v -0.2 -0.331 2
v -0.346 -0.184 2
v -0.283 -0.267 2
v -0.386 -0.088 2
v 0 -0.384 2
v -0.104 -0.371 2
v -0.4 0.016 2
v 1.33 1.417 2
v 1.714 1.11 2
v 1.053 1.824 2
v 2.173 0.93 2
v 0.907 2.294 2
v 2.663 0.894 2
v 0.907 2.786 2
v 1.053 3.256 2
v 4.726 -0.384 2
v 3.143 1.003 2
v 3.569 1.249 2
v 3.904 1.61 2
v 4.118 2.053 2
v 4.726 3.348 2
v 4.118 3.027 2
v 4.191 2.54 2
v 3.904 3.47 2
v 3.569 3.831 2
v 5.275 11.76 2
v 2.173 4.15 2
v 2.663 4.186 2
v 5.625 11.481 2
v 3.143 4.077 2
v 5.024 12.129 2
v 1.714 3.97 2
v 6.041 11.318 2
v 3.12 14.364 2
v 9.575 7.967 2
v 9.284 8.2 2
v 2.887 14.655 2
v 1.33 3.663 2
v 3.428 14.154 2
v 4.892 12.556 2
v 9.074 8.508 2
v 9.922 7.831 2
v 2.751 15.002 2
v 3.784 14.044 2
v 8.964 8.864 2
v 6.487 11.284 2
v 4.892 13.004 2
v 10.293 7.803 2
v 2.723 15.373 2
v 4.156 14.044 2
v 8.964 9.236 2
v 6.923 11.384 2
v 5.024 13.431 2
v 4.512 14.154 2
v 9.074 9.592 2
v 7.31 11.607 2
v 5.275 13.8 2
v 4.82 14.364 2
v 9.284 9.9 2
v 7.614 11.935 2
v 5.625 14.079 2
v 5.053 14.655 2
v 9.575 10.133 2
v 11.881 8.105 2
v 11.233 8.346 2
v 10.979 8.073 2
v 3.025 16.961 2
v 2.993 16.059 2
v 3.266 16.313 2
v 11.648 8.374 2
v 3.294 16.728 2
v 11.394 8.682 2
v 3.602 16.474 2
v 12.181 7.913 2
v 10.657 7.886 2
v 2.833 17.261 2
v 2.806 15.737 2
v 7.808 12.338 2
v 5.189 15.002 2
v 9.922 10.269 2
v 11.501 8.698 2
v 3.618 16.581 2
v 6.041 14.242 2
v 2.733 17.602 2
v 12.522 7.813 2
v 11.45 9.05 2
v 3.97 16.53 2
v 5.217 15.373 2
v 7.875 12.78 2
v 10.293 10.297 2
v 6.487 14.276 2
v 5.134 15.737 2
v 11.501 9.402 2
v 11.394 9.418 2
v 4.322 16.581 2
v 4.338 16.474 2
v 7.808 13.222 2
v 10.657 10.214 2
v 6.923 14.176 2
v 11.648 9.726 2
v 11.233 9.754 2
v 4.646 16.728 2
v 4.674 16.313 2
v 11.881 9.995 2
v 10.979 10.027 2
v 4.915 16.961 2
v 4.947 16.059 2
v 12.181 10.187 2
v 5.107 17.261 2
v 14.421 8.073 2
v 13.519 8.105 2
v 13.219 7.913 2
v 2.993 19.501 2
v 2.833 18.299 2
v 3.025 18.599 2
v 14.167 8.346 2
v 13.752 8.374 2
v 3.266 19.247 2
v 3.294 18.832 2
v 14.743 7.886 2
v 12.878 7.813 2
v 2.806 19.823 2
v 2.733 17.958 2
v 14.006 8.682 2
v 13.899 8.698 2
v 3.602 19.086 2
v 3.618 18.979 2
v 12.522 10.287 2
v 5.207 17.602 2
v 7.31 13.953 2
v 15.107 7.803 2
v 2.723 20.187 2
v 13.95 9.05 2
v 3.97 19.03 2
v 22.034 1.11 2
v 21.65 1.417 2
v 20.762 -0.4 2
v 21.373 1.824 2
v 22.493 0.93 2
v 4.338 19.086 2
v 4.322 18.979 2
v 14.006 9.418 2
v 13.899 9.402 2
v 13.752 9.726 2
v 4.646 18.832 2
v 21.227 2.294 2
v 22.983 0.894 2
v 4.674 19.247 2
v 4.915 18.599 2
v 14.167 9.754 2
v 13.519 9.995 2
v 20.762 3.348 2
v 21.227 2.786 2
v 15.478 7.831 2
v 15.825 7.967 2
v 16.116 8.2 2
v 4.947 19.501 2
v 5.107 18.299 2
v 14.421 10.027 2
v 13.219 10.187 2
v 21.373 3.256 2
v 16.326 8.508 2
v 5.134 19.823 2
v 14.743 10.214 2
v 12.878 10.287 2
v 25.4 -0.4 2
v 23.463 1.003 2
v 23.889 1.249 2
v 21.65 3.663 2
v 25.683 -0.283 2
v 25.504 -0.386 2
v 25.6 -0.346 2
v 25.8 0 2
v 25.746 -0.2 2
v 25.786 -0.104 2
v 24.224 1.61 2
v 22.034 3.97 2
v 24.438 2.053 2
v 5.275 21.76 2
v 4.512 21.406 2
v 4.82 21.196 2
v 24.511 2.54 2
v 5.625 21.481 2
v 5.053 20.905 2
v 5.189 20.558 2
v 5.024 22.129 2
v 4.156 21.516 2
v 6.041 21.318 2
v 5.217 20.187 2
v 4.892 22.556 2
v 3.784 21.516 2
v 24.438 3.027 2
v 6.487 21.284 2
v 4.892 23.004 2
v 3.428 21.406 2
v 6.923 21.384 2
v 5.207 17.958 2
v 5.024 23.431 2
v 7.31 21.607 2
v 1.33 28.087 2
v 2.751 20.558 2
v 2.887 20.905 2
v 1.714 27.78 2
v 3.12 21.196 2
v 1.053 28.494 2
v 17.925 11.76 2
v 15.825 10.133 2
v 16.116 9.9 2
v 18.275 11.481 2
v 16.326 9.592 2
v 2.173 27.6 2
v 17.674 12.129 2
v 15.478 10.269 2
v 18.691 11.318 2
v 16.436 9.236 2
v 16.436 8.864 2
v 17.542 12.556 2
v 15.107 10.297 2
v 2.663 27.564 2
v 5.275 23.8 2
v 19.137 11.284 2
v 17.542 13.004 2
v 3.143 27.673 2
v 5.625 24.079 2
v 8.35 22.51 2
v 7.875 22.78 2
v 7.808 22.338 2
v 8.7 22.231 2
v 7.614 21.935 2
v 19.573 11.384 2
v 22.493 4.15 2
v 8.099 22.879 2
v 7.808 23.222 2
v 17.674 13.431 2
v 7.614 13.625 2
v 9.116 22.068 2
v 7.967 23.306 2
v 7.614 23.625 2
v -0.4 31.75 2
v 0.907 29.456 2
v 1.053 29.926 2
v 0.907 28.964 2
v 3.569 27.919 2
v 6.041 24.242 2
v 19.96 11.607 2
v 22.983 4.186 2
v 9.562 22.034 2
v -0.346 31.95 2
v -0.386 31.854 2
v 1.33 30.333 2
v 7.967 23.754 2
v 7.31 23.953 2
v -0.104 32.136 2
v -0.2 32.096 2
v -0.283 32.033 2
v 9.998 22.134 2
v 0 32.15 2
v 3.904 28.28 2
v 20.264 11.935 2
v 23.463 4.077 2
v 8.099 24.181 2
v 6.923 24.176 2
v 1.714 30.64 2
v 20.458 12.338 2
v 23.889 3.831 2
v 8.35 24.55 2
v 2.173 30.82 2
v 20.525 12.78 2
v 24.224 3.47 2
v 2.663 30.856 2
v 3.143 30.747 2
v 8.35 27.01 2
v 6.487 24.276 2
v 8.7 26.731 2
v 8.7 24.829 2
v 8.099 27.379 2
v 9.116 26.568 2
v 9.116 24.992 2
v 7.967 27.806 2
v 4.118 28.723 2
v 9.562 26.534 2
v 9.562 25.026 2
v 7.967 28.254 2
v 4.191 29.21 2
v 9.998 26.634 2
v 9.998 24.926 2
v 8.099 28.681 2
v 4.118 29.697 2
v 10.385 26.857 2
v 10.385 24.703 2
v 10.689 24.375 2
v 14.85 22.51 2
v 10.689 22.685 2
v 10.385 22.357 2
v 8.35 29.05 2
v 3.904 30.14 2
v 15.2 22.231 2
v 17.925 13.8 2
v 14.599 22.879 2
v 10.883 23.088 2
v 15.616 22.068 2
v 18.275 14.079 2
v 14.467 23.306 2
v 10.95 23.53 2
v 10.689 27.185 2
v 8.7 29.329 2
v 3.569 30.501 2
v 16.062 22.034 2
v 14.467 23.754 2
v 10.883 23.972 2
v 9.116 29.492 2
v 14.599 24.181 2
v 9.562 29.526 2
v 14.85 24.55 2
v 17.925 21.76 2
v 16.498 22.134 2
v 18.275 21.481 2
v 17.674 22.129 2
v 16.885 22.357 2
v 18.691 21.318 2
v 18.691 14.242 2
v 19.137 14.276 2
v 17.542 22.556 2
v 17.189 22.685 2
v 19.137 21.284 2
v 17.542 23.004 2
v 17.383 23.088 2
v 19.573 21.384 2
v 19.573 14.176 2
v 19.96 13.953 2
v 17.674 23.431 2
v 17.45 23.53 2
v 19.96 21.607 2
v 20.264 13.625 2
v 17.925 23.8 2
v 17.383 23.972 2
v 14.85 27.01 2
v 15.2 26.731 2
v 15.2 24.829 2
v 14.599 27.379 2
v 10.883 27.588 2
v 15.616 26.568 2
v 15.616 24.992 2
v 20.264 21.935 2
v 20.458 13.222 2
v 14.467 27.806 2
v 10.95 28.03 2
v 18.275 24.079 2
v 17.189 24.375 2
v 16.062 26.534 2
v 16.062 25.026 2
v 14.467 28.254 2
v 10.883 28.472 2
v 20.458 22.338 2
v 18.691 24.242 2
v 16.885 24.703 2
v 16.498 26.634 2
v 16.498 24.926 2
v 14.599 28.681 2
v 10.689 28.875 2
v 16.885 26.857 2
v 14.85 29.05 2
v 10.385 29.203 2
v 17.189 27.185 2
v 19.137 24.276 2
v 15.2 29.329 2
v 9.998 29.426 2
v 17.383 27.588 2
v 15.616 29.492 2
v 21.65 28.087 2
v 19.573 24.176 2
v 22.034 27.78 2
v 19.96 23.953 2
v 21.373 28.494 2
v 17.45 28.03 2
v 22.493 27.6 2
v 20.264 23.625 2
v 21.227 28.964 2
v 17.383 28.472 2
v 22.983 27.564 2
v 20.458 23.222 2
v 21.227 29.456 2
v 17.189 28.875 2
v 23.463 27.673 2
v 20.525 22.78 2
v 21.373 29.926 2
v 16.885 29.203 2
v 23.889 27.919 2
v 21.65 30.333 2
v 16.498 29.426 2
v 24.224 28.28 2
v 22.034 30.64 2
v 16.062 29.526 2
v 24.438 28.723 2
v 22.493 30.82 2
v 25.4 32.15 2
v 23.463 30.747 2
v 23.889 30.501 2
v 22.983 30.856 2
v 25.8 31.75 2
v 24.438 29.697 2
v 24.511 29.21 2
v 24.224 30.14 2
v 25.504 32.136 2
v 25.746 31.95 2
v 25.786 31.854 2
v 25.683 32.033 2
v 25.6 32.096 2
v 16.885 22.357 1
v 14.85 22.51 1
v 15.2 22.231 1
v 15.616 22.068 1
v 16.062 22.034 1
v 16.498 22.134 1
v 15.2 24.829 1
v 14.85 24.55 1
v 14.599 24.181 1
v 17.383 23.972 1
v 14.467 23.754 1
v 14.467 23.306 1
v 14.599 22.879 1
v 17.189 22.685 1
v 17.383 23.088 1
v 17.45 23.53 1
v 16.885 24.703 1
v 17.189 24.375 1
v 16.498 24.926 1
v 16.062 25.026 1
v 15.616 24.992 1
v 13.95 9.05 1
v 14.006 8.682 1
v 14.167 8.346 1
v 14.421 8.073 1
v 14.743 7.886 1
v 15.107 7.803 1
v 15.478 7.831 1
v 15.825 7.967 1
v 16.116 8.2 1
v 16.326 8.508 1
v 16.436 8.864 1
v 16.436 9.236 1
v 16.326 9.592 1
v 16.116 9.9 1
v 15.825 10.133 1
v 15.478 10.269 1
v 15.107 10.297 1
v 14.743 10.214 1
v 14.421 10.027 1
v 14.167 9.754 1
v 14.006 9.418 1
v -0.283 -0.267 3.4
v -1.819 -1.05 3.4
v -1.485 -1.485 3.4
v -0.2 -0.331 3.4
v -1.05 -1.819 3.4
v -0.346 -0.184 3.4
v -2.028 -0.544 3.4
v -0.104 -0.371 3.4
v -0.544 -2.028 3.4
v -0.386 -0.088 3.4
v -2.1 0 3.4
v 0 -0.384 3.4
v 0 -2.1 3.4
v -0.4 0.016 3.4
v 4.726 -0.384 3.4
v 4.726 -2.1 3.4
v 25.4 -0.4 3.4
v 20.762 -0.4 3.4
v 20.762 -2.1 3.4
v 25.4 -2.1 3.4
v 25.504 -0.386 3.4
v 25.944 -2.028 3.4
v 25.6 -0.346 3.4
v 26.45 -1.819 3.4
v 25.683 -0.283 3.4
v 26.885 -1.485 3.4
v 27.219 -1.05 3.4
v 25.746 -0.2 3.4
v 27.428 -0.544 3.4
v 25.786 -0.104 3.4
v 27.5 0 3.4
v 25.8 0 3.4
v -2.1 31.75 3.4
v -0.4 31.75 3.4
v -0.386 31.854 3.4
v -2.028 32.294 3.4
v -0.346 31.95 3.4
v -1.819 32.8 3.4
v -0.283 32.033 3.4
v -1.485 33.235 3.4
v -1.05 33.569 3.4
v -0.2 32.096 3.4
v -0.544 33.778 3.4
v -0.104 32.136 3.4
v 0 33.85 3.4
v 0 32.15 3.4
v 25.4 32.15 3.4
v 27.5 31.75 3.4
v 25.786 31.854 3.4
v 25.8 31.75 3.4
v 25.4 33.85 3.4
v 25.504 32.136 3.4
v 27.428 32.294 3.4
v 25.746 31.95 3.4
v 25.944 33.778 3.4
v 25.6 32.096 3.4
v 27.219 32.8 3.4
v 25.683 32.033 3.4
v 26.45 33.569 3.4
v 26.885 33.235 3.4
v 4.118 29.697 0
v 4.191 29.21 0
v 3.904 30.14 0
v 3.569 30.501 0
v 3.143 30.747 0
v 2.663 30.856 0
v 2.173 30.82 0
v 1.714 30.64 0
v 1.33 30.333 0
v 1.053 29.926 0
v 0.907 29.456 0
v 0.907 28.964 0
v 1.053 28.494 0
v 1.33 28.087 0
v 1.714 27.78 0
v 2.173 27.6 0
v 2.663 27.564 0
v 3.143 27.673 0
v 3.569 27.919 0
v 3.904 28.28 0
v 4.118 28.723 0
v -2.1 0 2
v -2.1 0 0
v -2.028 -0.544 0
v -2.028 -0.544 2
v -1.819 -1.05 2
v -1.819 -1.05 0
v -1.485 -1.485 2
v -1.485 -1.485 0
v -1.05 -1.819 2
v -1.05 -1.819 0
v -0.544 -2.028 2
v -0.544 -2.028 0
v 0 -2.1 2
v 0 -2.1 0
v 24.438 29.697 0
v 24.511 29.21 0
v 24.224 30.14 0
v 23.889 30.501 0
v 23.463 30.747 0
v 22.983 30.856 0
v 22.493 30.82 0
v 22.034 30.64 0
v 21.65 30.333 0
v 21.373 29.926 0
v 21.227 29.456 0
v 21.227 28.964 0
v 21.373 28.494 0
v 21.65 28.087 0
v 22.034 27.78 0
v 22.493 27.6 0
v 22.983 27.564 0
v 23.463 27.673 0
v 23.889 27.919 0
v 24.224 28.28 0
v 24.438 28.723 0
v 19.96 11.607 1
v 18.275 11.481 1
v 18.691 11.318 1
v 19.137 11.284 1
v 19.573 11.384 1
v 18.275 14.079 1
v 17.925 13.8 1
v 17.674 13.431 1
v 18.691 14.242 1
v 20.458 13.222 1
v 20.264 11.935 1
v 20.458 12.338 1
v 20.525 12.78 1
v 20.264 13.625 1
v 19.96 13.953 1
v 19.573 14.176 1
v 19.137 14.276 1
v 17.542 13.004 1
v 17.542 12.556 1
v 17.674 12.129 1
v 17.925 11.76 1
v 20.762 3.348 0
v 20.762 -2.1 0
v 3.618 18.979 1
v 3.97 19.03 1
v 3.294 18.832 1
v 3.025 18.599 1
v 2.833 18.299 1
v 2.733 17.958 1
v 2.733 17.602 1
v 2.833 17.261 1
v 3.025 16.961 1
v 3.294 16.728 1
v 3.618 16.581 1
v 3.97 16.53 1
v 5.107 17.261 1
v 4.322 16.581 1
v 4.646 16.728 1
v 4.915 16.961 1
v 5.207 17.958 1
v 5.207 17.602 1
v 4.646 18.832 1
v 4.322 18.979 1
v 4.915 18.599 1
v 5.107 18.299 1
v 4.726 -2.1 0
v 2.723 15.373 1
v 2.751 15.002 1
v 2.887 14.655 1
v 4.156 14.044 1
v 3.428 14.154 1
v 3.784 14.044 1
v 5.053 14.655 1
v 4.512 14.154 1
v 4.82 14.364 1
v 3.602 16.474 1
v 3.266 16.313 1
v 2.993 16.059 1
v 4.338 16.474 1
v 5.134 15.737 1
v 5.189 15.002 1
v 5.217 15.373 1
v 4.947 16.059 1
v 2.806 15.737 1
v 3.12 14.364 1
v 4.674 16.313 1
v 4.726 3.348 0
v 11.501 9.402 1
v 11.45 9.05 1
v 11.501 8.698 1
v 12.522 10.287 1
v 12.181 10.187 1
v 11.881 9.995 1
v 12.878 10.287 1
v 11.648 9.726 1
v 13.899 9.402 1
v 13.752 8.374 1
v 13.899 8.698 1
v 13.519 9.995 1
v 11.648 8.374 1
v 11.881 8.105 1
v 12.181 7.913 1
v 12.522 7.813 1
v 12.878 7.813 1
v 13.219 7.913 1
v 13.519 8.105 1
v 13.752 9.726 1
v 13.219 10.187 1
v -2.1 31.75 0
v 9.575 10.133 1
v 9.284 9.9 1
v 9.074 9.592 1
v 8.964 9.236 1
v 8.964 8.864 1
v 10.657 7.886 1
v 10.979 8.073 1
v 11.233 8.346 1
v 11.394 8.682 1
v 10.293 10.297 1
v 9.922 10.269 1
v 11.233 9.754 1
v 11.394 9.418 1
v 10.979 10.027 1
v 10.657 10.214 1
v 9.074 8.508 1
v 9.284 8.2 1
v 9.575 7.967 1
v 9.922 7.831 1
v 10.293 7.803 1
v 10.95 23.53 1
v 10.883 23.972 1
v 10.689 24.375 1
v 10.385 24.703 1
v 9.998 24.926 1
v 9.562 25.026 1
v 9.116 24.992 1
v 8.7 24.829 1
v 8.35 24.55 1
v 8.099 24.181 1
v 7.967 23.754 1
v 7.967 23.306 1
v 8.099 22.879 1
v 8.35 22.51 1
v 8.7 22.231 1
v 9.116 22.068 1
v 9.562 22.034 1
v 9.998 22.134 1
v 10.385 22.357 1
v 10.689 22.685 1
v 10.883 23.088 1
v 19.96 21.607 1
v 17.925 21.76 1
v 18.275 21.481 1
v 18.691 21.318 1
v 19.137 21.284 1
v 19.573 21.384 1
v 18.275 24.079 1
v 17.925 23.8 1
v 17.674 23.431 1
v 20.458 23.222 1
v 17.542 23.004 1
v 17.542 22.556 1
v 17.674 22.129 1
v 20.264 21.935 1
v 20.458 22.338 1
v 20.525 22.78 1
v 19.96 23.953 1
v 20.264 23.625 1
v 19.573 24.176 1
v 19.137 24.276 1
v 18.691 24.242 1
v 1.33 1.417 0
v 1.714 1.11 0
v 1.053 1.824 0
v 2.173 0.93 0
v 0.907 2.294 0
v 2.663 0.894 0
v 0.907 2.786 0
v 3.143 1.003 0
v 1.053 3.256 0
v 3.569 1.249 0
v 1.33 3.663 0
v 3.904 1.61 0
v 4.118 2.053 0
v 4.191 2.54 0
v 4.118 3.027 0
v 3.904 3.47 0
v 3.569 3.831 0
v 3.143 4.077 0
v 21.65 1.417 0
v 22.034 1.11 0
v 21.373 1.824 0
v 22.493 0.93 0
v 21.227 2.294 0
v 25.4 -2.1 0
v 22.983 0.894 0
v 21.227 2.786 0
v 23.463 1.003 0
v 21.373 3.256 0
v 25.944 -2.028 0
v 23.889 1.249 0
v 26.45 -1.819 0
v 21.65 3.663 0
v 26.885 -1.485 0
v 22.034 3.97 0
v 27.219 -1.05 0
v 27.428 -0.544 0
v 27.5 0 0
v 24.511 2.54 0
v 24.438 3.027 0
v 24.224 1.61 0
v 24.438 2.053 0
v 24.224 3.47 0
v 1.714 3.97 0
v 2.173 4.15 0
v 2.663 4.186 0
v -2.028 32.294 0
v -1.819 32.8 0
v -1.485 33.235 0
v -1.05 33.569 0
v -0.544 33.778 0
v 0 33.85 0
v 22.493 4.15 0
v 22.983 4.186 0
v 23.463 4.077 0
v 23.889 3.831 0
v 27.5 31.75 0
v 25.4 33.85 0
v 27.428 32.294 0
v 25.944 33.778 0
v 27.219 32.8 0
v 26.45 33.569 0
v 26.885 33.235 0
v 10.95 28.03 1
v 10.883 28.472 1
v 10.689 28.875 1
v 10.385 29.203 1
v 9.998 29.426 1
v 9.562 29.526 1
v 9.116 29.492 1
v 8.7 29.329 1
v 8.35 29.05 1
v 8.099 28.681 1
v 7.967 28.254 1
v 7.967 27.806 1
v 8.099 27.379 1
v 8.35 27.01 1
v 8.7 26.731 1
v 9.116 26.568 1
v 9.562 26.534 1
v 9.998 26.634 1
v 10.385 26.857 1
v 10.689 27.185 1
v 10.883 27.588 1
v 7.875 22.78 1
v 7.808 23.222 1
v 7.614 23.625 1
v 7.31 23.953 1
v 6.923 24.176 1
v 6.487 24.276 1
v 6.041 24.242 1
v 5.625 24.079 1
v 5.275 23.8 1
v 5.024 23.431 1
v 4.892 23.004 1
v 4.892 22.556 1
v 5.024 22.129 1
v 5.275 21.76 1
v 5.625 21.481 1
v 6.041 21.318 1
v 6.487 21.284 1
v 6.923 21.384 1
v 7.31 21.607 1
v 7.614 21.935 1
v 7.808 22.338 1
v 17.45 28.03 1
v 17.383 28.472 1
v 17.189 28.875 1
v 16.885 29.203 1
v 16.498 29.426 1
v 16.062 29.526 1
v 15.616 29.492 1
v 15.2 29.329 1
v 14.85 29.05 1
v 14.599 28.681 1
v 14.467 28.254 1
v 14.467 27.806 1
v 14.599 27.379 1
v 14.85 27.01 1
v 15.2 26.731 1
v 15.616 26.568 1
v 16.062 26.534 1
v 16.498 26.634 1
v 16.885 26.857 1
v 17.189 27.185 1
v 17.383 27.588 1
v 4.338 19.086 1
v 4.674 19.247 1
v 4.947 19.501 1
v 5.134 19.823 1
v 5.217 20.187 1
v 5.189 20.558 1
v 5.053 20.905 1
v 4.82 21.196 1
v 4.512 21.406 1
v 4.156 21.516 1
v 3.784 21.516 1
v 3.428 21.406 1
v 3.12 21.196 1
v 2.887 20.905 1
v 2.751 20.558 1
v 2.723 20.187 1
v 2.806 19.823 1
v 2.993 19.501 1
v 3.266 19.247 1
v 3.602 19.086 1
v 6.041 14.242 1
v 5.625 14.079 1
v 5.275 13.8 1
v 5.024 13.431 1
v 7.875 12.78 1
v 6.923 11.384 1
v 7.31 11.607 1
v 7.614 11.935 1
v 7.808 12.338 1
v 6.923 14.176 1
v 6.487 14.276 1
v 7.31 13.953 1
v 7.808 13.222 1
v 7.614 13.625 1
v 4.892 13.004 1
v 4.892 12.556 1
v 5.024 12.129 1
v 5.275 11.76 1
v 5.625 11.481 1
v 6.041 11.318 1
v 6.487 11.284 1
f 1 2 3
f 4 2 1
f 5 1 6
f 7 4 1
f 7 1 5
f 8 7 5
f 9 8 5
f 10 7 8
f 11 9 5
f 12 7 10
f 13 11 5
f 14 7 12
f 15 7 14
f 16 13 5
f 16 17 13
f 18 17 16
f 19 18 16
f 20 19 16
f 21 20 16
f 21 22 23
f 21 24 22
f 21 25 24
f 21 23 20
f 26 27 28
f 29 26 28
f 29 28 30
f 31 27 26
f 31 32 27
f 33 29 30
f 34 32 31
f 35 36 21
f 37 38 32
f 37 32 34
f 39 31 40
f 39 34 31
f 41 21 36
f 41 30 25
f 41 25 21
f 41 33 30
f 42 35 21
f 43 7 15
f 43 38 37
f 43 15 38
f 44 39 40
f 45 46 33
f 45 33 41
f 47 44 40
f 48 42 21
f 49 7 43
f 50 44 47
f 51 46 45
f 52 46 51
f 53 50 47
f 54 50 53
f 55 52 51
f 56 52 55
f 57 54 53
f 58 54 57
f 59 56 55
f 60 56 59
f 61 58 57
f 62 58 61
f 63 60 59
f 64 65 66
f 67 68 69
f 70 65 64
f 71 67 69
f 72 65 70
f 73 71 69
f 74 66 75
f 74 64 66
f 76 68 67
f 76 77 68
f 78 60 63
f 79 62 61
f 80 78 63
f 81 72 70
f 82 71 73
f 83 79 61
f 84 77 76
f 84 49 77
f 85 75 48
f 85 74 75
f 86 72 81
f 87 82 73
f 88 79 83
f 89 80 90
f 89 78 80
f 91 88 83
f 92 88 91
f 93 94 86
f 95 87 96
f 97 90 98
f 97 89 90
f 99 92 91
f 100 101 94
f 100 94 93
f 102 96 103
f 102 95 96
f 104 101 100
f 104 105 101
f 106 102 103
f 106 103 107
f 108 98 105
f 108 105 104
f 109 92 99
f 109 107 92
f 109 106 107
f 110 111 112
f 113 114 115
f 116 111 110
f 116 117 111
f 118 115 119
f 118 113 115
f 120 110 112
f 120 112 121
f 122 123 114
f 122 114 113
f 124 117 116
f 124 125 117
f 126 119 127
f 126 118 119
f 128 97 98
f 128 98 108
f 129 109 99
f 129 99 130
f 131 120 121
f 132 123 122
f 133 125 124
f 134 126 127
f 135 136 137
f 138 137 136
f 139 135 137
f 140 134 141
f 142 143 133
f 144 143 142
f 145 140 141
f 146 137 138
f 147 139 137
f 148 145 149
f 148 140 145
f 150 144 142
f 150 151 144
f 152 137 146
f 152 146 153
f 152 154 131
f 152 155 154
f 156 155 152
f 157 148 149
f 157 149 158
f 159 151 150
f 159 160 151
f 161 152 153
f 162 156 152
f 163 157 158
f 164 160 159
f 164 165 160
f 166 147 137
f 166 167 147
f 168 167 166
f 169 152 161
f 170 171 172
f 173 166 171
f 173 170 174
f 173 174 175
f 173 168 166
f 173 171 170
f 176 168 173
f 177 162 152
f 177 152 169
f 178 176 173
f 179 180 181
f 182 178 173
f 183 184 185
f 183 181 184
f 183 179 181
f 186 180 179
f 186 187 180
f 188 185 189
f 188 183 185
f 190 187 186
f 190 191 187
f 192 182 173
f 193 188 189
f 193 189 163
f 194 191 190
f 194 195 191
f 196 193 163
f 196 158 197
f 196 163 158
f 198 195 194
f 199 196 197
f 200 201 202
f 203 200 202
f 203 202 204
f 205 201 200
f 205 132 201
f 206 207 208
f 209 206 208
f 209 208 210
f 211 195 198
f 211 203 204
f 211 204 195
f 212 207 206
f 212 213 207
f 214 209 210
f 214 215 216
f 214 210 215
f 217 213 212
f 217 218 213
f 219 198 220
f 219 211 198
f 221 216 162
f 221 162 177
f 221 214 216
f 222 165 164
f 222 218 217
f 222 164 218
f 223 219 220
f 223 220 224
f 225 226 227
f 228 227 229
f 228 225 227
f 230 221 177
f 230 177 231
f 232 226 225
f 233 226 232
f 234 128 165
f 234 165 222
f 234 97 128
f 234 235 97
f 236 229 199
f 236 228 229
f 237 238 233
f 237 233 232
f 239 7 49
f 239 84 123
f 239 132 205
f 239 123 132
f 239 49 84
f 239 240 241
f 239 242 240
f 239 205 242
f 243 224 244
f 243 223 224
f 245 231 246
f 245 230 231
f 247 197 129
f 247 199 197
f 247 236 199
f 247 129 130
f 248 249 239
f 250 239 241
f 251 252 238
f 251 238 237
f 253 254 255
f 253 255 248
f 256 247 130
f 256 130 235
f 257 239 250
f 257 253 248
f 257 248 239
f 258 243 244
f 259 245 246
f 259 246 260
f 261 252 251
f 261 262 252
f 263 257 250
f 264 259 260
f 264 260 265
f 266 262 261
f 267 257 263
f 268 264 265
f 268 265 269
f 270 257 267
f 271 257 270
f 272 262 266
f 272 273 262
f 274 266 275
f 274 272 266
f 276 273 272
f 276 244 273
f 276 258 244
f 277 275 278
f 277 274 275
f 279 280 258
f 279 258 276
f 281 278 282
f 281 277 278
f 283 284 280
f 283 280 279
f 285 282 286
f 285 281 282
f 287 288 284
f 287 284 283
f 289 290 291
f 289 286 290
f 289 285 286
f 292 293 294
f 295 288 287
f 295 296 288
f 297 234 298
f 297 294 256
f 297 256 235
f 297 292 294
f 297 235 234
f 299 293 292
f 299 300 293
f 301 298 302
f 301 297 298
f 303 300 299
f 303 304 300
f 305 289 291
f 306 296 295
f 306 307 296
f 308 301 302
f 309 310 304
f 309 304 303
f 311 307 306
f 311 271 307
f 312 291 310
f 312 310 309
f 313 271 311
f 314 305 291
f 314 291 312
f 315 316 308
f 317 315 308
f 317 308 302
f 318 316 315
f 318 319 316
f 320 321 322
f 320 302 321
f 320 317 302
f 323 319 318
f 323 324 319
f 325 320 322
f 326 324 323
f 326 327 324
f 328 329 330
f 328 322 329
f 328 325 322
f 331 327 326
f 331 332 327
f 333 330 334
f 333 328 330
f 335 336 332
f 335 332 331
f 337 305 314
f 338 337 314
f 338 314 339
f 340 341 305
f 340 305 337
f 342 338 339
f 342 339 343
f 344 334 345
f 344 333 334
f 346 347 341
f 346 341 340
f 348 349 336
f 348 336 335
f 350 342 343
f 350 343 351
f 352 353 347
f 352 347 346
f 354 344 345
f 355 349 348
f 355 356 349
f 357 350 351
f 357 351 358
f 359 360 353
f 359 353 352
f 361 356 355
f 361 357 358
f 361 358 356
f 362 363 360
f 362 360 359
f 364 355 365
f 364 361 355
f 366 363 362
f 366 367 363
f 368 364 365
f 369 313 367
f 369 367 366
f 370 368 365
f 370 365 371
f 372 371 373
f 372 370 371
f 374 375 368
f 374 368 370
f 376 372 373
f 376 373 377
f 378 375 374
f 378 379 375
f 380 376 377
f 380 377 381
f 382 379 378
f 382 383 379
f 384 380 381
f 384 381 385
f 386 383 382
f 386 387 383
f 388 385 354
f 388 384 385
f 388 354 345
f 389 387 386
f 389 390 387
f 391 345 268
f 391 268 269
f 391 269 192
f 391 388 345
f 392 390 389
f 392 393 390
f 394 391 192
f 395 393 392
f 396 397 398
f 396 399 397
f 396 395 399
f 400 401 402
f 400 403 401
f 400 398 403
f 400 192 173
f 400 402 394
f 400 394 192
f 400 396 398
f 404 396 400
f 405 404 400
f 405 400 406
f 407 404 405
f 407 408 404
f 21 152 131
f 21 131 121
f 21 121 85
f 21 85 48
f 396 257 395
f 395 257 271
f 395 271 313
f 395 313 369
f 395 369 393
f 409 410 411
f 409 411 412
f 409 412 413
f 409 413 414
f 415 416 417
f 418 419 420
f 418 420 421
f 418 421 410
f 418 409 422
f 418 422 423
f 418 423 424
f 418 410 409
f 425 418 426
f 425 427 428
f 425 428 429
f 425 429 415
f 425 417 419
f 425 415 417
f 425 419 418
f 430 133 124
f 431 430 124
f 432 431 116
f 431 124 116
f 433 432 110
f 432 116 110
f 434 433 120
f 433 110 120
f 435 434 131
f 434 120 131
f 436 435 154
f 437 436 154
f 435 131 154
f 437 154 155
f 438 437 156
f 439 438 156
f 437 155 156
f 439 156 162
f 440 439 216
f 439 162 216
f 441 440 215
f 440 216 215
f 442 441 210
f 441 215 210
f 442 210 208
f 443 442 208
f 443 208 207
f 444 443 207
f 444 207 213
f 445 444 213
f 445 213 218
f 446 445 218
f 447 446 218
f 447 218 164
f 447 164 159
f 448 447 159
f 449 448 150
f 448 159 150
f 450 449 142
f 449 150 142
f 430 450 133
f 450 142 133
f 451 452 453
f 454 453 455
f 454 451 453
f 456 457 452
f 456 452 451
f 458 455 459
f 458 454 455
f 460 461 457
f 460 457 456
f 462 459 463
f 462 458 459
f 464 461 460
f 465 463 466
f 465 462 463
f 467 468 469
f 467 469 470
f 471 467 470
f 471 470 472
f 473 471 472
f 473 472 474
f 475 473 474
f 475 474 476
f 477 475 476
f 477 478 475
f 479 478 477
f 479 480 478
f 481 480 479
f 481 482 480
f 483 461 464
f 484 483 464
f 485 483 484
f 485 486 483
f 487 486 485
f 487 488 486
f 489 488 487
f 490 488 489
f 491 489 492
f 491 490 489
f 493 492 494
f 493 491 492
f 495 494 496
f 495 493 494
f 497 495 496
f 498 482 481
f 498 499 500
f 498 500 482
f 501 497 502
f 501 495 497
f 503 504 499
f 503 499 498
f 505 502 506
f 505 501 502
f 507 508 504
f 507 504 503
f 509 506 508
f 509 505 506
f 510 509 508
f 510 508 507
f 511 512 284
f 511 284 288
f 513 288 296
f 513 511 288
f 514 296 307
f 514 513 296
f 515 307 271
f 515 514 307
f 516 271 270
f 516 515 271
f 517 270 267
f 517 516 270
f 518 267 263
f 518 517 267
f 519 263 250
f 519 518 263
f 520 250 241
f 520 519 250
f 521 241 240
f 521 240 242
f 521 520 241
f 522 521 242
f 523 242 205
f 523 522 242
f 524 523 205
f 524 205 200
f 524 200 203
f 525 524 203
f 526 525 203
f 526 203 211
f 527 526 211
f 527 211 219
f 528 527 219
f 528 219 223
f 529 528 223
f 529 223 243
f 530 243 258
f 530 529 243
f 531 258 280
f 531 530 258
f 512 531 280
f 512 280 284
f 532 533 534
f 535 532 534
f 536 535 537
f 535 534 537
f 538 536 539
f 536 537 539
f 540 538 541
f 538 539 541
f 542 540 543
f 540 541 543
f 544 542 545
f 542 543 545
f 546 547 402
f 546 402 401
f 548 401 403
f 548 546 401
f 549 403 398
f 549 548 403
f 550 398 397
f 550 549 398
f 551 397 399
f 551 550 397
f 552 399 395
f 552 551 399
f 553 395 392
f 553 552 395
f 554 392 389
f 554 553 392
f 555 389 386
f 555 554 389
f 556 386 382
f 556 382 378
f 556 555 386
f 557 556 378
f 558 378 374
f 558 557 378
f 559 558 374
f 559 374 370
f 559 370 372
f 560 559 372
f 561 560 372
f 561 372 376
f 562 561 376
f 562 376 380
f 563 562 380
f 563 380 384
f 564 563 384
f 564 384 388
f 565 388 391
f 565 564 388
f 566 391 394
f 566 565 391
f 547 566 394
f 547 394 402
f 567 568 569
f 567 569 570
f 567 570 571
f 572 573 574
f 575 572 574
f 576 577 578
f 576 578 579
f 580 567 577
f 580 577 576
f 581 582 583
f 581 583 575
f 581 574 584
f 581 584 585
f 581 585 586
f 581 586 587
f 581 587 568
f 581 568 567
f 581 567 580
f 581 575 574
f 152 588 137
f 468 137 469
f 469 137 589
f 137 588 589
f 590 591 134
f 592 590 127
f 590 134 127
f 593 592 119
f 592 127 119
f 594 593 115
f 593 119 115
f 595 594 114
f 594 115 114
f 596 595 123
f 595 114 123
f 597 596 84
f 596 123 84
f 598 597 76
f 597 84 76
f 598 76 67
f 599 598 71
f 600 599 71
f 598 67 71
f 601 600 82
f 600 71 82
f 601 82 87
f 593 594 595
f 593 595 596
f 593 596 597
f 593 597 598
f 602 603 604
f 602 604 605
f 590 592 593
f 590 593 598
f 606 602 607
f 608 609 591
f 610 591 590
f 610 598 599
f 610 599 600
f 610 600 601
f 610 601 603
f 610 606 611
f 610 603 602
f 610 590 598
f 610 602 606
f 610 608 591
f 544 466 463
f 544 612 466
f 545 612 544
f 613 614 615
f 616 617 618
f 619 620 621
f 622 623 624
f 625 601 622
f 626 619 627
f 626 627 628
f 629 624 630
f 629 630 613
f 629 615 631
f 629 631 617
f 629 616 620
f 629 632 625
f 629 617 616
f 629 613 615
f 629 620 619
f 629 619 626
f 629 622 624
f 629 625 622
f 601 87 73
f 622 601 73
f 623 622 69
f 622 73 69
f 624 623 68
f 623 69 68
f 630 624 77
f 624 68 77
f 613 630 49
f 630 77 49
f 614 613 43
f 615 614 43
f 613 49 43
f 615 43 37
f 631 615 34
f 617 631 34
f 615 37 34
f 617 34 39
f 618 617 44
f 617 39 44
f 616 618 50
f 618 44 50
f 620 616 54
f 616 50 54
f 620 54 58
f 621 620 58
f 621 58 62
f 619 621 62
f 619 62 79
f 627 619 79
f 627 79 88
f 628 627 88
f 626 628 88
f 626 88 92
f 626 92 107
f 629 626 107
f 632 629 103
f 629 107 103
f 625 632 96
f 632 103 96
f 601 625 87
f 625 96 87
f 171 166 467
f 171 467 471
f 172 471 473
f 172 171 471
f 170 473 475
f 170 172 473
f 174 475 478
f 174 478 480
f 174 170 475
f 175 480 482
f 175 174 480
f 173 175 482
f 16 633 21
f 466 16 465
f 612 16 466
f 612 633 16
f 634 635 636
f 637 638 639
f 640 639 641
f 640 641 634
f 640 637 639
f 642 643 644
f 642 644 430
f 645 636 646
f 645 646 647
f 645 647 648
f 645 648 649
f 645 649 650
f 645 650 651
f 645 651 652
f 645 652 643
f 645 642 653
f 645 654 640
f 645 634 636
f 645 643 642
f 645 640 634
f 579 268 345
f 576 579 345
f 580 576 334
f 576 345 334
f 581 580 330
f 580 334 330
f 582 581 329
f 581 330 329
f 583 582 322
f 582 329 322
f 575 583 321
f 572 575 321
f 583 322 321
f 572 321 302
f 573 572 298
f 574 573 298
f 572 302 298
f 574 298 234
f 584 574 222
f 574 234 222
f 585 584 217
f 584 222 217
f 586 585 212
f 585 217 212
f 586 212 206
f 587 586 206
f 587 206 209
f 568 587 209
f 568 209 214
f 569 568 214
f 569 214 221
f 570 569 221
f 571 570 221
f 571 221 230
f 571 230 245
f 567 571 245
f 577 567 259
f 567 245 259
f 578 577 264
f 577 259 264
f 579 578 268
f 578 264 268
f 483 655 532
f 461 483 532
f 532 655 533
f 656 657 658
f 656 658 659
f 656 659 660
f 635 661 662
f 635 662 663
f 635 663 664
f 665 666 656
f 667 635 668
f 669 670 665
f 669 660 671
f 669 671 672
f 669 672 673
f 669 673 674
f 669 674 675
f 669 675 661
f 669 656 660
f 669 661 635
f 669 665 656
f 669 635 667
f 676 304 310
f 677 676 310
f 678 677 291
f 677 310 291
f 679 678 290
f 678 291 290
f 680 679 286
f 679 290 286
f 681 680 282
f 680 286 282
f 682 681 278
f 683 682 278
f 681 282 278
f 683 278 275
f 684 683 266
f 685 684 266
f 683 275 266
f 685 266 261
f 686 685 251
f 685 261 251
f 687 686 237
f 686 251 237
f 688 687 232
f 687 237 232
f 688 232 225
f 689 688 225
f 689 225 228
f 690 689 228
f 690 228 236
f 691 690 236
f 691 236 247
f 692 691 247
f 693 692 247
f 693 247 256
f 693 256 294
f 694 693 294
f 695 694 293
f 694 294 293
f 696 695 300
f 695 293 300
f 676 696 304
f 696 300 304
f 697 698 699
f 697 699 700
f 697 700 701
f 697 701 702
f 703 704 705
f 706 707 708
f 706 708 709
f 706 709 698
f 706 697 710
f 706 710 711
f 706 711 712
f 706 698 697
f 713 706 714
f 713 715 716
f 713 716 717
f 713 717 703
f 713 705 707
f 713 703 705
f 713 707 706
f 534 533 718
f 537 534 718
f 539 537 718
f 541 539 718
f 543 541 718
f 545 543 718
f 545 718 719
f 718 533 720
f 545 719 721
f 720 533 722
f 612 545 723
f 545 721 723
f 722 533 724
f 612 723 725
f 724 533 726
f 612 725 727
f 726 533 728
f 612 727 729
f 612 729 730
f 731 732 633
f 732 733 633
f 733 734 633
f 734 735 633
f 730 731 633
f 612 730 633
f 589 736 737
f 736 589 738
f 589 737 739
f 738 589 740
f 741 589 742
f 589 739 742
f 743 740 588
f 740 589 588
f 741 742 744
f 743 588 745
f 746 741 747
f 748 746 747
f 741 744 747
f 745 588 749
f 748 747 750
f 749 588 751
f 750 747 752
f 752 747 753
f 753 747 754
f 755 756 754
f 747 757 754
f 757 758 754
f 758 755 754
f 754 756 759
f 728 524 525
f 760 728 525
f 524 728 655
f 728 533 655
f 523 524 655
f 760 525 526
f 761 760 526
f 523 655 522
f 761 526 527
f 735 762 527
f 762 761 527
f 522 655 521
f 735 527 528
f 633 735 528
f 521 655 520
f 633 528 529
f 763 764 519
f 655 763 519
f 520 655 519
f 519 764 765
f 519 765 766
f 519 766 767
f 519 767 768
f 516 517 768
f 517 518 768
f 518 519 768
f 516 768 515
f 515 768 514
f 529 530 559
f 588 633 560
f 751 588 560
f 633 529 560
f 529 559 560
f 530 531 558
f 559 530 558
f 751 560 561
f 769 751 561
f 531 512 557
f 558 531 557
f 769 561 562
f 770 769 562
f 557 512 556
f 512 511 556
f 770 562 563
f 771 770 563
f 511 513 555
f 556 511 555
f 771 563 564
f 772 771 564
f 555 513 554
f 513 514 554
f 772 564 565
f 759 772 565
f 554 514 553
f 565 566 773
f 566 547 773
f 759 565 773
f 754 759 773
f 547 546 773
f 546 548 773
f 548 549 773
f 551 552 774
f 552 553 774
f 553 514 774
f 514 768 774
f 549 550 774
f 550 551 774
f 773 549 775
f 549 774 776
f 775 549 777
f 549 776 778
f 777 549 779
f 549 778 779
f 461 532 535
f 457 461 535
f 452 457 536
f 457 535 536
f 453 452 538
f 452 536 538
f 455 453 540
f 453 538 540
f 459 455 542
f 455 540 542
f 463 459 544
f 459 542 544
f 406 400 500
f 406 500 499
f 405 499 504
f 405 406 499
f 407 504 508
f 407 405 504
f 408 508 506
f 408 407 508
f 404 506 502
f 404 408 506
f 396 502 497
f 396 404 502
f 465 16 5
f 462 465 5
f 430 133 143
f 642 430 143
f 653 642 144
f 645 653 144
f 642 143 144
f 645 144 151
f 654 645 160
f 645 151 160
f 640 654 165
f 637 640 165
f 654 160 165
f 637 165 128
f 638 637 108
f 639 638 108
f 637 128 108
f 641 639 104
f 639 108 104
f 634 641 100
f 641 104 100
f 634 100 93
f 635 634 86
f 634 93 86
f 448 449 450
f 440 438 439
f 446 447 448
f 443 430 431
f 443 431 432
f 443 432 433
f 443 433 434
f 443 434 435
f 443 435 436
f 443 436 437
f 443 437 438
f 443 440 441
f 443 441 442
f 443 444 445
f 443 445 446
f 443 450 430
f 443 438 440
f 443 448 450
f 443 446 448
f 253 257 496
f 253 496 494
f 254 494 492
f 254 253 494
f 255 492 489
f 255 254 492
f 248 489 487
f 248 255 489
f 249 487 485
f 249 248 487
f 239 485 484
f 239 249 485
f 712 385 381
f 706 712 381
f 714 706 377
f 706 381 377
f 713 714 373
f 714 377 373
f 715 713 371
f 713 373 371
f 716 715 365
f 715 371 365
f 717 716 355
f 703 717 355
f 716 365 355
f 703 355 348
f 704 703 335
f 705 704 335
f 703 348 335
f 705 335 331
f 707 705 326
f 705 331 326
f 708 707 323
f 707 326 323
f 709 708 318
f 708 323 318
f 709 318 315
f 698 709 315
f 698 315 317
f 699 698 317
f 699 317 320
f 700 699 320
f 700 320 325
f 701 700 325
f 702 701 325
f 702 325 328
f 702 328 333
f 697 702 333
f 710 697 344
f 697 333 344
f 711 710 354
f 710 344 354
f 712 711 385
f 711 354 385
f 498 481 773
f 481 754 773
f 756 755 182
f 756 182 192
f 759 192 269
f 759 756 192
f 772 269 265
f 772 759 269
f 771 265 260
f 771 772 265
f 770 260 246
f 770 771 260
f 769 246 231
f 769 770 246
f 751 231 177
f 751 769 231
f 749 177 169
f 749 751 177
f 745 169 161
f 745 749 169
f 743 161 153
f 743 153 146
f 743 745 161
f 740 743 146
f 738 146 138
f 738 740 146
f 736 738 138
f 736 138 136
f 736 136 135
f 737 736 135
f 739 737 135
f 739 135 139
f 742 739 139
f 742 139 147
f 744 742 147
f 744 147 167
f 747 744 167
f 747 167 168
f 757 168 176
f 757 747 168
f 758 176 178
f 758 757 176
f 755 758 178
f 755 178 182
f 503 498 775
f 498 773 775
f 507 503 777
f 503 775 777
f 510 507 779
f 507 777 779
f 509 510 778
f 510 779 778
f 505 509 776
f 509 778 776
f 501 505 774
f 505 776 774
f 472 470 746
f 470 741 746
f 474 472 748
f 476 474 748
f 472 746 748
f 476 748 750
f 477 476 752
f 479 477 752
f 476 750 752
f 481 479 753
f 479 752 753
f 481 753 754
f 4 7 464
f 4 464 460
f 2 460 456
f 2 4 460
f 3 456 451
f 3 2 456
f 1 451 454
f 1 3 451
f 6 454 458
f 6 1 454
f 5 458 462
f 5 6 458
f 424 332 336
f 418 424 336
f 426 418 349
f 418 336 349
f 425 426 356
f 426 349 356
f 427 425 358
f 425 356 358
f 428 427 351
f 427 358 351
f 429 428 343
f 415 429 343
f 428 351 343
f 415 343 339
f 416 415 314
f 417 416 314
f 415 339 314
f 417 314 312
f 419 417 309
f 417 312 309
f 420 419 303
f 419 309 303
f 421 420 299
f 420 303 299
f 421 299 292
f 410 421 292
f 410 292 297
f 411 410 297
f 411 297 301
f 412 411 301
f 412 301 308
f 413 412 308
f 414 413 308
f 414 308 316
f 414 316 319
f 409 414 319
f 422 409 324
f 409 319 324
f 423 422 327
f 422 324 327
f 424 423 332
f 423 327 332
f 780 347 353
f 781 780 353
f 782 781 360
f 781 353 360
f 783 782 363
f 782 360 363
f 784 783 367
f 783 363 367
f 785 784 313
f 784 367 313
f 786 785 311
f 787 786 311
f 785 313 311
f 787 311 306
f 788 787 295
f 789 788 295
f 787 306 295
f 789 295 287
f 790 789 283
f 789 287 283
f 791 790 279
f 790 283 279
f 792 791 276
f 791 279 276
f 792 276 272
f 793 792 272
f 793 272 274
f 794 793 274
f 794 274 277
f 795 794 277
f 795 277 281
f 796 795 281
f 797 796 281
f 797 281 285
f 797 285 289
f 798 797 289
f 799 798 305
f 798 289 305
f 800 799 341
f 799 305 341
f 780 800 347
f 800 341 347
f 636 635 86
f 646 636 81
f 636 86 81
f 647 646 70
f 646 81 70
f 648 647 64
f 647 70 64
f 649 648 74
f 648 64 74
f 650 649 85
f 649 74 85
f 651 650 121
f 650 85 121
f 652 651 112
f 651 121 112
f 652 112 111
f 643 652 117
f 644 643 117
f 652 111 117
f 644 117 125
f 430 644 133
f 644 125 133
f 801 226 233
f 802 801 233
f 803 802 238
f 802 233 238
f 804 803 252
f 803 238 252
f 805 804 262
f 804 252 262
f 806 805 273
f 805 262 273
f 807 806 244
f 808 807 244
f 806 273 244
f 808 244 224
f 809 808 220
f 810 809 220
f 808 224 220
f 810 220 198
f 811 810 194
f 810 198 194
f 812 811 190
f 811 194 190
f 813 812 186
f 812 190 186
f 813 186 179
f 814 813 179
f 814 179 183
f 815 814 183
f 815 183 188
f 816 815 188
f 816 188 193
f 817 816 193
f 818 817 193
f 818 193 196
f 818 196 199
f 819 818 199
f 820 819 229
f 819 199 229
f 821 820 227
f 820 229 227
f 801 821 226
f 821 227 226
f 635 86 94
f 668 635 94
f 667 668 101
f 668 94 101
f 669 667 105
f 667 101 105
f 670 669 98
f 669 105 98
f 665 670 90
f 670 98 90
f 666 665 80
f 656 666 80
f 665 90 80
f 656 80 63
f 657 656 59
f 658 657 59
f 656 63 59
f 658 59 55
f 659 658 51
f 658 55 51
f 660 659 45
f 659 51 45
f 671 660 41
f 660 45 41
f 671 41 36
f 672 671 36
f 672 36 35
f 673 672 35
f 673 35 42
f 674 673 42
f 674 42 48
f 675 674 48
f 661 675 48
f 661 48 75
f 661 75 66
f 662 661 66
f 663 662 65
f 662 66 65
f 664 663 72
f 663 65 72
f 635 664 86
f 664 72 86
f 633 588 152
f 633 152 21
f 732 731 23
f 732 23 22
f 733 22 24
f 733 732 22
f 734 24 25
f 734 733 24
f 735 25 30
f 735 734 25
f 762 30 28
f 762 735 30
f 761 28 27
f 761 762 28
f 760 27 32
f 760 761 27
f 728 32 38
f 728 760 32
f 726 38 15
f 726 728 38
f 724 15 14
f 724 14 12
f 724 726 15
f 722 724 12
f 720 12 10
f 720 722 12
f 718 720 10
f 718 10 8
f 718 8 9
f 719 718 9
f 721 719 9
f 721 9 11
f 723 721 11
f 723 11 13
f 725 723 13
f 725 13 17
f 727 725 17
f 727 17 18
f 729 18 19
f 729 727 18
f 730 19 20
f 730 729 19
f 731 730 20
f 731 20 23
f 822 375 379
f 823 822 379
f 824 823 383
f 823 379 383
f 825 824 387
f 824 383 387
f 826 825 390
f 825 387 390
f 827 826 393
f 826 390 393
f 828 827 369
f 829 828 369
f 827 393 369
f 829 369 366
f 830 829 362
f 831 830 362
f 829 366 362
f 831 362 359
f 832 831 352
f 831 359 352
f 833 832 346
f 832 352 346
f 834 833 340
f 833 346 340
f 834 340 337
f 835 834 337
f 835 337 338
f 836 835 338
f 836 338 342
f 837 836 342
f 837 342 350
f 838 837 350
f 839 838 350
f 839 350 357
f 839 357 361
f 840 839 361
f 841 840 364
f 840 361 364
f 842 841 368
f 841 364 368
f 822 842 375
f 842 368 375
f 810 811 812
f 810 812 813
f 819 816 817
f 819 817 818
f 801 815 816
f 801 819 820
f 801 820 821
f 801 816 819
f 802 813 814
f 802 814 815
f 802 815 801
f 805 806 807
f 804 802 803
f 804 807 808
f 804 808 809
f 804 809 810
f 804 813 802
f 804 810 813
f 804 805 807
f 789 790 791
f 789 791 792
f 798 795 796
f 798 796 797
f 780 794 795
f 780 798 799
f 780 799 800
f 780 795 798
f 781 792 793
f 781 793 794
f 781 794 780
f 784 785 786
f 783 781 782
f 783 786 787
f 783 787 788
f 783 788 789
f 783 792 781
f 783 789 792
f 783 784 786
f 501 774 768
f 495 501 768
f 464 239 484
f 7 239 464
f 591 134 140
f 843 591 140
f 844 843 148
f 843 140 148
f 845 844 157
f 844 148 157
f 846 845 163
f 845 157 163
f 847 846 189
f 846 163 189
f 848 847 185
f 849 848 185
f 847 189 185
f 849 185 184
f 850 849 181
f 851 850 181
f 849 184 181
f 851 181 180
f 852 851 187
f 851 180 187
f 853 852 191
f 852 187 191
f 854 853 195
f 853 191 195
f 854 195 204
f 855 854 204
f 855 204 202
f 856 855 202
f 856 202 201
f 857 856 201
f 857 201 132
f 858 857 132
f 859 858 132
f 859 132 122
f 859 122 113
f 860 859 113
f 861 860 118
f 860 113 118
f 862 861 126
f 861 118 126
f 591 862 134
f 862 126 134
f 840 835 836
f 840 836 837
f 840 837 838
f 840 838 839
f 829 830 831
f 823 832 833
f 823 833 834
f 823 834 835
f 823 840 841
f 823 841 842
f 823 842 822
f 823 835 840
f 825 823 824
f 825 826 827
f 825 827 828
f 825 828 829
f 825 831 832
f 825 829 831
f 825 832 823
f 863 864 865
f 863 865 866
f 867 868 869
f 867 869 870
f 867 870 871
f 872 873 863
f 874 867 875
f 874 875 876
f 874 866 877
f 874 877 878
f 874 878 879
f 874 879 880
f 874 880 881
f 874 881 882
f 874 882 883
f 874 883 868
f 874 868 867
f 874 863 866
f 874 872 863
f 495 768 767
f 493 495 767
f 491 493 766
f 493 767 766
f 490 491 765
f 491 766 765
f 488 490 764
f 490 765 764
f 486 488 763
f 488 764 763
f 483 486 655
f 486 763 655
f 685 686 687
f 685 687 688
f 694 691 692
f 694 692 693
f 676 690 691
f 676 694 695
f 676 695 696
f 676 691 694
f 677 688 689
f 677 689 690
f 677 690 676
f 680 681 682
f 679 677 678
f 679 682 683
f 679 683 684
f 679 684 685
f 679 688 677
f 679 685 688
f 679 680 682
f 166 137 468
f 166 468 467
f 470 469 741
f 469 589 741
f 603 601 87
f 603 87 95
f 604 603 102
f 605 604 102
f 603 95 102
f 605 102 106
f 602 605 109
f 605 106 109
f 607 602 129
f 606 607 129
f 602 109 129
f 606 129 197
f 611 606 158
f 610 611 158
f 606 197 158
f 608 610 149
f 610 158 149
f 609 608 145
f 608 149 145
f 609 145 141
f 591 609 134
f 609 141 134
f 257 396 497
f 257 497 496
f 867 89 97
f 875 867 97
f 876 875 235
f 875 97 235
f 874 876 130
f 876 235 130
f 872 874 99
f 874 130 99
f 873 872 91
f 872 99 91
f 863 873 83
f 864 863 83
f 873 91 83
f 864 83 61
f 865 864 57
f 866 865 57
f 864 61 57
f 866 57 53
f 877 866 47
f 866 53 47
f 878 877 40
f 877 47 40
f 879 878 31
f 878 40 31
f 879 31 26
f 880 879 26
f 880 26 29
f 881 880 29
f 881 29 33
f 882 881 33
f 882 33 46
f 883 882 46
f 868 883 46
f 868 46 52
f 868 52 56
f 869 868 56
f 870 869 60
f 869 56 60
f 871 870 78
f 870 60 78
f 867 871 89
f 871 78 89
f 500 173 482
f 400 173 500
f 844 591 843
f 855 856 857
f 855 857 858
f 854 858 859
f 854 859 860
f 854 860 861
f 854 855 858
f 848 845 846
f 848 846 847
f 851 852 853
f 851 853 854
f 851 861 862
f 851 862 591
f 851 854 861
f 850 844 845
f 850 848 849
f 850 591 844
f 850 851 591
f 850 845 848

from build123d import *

# Parameters (mm, degrees)
SKETCH002_R   = 1.651
PAD_DEPTH     = 2
SKETCH004_R   = 1.5
SKETCH004_R_2 = 1.25
POCKET_DEPTH  = 1
PAD001_DEPTH  = 1.4


with BuildPart() as part:
    # Sketch002 → Pad (new body)
    with BuildSketch(Plane.XY):
        with BuildLine():
            Line((-2.1, 31.749999), (-2.1, -1e-06))
            ThreePointArc((-2.1, -1e-06), (-1.484924, -1.484925), (0, -2.1))
            Line((4.726249, -2.1), (0, -2.1))
            Line((4.726249, 3.34784), (4.726249, -2.1))
            Line((20.762018, 3.34784), (4.726249, 3.34784))
            Line((20.762018, -2.1), (20.762018, 3.34784))
            Line((20.762018, -2.1), (25.4, -2.1))
            ThreePointArc((25.4, -2.1), (26.884924, -1.484924), (27.5, -1e-06))
            Line((27.5, -1e-06), (27.5, 31.75))
            ThreePointArc((27.5, 31.75), (26.884924, 33.234924), (25.400001, 33.85))
            Line((25.400001, 33.85), (1e-06, 33.85))
            ThreePointArc((1e-06, 33.85), (-1.484924, 33.234924), (-2.1, 31.749999))
        make_face()
        with Locations((2.54, 29.21)):
            Circle(SKETCH002_R, mode=Mode.SUBTRACT)
        with Locations((22.86, 29.21)):
            Circle(SKETCH002_R, mode=Mode.SUBTRACT)
        with Locations((22.86, 2.54)):
            Circle(SKETCH002_R, mode=Mode.SUBTRACT)
        with Locations((2.54, 2.54)):
            Circle(SKETCH002_R, mode=Mode.SUBTRACT)
    extrude(amount=PAD_DEPTH)

    # Sketch004 (on Face18 of Pad) → Pocket (cut)
    with BuildSketch(Plane.XY.offset(2)):
        with Locations((9.45, 28.03)):
            Circle(SKETCH004_R)
        with Locations((15.95, 28.03)):
            Circle(SKETCH004_R)
        with Locations((19.025, 22.78)):
            Circle(SKETCH004_R)
        with Locations((15.95, 23.53)):
            Circle(SKETCH004_R)
        with Locations((9.45, 23.53)):
            Circle(SKETCH004_R)
        with Locations((6.375, 22.78)):
            Circle(SKETCH004_R)
        with Locations((3.97, 20.28)):
            Circle(SKETCH004_R_2)
        with Locations((3.97, 17.78)):
            Circle(SKETCH004_R_2)
        with Locations((3.97, 15.28)):
            Circle(SKETCH004_R_2)
        with Locations((6.375, 12.78)):
            Circle(SKETCH004_R)
        with Locations((10.2, 9.05)):
            Circle(SKETCH004_R_2)
        with Locations((12.7, 9.05)):
            Circle(SKETCH004_R_2)
        with Locations((15.2, 9.05)):
            Circle(SKETCH004_R_2)
        with Locations((19.025, 12.78)):
            Circle(SKETCH004_R)
    extrude(amount=-POCKET_DEPTH, mode=Mode.SUBTRACT)

    # Sketch005 (on Face9 of Pocket) → Pad001 (join)
    with BuildSketch(Plane.XY.offset(2)):
        with BuildLine():
            Line((-2.1, 31.749999), (-2.1, -1e-06))
            ThreePointArc((-2.1, -1e-06), (-1.484924, -1.484924), (0, -2.1))
            Line((4.726249, -2.1), (0, -2.1))
            Line((4.726249, -0.384166), (4.726249, -2.1))
            Line((4.726249, -0.384166), (0, -0.384166))
            ThreePointArc((-0.4, 0.015834), (-0.282843, -0.267009), (0, -0.384166))
            Line((-0.4, 31.75), (-0.4, 0.015834))
            ThreePointArc((0, 32.15), (-0.282843, 32.032843), (-0.4, 31.75))
            Line((25.4, 32.15), (0, 32.15))
            ThreePointArc((25.8, 31.75), (25.682843, 32.032843), (25.4, 32.15))
            Line((25.8, 0), (25.8, 31.75))
            ThreePointArc((25.4, -0.4), (25.682843, -0.282843), (25.8, 0))
            Line((20.762018, -0.4), (25.4, -0.4))
            Line((20.762018, -0.4), (20.762018, -2.1))
            Line((20.762018, -2.1), (25.4, -2.1))
            ThreePointArc((25.4, -2.1), (26.884924, -1.484924), (27.5, -1e-06))
            Line((27.5, -1e-06), (27.5, 31.75))
            ThreePointArc((27.5, 31.75), (26.884924, 33.234924), (25.400001, 33.85))
            Line((25.400001, 33.85), (1e-06, 33.85))
            ThreePointArc((1e-06, 33.85), (-1.484924, 33.234924), (-2.1, 31.749999))
        make_face()
    extrude(amount=PAD001_DEPTH)


solid = part.part
